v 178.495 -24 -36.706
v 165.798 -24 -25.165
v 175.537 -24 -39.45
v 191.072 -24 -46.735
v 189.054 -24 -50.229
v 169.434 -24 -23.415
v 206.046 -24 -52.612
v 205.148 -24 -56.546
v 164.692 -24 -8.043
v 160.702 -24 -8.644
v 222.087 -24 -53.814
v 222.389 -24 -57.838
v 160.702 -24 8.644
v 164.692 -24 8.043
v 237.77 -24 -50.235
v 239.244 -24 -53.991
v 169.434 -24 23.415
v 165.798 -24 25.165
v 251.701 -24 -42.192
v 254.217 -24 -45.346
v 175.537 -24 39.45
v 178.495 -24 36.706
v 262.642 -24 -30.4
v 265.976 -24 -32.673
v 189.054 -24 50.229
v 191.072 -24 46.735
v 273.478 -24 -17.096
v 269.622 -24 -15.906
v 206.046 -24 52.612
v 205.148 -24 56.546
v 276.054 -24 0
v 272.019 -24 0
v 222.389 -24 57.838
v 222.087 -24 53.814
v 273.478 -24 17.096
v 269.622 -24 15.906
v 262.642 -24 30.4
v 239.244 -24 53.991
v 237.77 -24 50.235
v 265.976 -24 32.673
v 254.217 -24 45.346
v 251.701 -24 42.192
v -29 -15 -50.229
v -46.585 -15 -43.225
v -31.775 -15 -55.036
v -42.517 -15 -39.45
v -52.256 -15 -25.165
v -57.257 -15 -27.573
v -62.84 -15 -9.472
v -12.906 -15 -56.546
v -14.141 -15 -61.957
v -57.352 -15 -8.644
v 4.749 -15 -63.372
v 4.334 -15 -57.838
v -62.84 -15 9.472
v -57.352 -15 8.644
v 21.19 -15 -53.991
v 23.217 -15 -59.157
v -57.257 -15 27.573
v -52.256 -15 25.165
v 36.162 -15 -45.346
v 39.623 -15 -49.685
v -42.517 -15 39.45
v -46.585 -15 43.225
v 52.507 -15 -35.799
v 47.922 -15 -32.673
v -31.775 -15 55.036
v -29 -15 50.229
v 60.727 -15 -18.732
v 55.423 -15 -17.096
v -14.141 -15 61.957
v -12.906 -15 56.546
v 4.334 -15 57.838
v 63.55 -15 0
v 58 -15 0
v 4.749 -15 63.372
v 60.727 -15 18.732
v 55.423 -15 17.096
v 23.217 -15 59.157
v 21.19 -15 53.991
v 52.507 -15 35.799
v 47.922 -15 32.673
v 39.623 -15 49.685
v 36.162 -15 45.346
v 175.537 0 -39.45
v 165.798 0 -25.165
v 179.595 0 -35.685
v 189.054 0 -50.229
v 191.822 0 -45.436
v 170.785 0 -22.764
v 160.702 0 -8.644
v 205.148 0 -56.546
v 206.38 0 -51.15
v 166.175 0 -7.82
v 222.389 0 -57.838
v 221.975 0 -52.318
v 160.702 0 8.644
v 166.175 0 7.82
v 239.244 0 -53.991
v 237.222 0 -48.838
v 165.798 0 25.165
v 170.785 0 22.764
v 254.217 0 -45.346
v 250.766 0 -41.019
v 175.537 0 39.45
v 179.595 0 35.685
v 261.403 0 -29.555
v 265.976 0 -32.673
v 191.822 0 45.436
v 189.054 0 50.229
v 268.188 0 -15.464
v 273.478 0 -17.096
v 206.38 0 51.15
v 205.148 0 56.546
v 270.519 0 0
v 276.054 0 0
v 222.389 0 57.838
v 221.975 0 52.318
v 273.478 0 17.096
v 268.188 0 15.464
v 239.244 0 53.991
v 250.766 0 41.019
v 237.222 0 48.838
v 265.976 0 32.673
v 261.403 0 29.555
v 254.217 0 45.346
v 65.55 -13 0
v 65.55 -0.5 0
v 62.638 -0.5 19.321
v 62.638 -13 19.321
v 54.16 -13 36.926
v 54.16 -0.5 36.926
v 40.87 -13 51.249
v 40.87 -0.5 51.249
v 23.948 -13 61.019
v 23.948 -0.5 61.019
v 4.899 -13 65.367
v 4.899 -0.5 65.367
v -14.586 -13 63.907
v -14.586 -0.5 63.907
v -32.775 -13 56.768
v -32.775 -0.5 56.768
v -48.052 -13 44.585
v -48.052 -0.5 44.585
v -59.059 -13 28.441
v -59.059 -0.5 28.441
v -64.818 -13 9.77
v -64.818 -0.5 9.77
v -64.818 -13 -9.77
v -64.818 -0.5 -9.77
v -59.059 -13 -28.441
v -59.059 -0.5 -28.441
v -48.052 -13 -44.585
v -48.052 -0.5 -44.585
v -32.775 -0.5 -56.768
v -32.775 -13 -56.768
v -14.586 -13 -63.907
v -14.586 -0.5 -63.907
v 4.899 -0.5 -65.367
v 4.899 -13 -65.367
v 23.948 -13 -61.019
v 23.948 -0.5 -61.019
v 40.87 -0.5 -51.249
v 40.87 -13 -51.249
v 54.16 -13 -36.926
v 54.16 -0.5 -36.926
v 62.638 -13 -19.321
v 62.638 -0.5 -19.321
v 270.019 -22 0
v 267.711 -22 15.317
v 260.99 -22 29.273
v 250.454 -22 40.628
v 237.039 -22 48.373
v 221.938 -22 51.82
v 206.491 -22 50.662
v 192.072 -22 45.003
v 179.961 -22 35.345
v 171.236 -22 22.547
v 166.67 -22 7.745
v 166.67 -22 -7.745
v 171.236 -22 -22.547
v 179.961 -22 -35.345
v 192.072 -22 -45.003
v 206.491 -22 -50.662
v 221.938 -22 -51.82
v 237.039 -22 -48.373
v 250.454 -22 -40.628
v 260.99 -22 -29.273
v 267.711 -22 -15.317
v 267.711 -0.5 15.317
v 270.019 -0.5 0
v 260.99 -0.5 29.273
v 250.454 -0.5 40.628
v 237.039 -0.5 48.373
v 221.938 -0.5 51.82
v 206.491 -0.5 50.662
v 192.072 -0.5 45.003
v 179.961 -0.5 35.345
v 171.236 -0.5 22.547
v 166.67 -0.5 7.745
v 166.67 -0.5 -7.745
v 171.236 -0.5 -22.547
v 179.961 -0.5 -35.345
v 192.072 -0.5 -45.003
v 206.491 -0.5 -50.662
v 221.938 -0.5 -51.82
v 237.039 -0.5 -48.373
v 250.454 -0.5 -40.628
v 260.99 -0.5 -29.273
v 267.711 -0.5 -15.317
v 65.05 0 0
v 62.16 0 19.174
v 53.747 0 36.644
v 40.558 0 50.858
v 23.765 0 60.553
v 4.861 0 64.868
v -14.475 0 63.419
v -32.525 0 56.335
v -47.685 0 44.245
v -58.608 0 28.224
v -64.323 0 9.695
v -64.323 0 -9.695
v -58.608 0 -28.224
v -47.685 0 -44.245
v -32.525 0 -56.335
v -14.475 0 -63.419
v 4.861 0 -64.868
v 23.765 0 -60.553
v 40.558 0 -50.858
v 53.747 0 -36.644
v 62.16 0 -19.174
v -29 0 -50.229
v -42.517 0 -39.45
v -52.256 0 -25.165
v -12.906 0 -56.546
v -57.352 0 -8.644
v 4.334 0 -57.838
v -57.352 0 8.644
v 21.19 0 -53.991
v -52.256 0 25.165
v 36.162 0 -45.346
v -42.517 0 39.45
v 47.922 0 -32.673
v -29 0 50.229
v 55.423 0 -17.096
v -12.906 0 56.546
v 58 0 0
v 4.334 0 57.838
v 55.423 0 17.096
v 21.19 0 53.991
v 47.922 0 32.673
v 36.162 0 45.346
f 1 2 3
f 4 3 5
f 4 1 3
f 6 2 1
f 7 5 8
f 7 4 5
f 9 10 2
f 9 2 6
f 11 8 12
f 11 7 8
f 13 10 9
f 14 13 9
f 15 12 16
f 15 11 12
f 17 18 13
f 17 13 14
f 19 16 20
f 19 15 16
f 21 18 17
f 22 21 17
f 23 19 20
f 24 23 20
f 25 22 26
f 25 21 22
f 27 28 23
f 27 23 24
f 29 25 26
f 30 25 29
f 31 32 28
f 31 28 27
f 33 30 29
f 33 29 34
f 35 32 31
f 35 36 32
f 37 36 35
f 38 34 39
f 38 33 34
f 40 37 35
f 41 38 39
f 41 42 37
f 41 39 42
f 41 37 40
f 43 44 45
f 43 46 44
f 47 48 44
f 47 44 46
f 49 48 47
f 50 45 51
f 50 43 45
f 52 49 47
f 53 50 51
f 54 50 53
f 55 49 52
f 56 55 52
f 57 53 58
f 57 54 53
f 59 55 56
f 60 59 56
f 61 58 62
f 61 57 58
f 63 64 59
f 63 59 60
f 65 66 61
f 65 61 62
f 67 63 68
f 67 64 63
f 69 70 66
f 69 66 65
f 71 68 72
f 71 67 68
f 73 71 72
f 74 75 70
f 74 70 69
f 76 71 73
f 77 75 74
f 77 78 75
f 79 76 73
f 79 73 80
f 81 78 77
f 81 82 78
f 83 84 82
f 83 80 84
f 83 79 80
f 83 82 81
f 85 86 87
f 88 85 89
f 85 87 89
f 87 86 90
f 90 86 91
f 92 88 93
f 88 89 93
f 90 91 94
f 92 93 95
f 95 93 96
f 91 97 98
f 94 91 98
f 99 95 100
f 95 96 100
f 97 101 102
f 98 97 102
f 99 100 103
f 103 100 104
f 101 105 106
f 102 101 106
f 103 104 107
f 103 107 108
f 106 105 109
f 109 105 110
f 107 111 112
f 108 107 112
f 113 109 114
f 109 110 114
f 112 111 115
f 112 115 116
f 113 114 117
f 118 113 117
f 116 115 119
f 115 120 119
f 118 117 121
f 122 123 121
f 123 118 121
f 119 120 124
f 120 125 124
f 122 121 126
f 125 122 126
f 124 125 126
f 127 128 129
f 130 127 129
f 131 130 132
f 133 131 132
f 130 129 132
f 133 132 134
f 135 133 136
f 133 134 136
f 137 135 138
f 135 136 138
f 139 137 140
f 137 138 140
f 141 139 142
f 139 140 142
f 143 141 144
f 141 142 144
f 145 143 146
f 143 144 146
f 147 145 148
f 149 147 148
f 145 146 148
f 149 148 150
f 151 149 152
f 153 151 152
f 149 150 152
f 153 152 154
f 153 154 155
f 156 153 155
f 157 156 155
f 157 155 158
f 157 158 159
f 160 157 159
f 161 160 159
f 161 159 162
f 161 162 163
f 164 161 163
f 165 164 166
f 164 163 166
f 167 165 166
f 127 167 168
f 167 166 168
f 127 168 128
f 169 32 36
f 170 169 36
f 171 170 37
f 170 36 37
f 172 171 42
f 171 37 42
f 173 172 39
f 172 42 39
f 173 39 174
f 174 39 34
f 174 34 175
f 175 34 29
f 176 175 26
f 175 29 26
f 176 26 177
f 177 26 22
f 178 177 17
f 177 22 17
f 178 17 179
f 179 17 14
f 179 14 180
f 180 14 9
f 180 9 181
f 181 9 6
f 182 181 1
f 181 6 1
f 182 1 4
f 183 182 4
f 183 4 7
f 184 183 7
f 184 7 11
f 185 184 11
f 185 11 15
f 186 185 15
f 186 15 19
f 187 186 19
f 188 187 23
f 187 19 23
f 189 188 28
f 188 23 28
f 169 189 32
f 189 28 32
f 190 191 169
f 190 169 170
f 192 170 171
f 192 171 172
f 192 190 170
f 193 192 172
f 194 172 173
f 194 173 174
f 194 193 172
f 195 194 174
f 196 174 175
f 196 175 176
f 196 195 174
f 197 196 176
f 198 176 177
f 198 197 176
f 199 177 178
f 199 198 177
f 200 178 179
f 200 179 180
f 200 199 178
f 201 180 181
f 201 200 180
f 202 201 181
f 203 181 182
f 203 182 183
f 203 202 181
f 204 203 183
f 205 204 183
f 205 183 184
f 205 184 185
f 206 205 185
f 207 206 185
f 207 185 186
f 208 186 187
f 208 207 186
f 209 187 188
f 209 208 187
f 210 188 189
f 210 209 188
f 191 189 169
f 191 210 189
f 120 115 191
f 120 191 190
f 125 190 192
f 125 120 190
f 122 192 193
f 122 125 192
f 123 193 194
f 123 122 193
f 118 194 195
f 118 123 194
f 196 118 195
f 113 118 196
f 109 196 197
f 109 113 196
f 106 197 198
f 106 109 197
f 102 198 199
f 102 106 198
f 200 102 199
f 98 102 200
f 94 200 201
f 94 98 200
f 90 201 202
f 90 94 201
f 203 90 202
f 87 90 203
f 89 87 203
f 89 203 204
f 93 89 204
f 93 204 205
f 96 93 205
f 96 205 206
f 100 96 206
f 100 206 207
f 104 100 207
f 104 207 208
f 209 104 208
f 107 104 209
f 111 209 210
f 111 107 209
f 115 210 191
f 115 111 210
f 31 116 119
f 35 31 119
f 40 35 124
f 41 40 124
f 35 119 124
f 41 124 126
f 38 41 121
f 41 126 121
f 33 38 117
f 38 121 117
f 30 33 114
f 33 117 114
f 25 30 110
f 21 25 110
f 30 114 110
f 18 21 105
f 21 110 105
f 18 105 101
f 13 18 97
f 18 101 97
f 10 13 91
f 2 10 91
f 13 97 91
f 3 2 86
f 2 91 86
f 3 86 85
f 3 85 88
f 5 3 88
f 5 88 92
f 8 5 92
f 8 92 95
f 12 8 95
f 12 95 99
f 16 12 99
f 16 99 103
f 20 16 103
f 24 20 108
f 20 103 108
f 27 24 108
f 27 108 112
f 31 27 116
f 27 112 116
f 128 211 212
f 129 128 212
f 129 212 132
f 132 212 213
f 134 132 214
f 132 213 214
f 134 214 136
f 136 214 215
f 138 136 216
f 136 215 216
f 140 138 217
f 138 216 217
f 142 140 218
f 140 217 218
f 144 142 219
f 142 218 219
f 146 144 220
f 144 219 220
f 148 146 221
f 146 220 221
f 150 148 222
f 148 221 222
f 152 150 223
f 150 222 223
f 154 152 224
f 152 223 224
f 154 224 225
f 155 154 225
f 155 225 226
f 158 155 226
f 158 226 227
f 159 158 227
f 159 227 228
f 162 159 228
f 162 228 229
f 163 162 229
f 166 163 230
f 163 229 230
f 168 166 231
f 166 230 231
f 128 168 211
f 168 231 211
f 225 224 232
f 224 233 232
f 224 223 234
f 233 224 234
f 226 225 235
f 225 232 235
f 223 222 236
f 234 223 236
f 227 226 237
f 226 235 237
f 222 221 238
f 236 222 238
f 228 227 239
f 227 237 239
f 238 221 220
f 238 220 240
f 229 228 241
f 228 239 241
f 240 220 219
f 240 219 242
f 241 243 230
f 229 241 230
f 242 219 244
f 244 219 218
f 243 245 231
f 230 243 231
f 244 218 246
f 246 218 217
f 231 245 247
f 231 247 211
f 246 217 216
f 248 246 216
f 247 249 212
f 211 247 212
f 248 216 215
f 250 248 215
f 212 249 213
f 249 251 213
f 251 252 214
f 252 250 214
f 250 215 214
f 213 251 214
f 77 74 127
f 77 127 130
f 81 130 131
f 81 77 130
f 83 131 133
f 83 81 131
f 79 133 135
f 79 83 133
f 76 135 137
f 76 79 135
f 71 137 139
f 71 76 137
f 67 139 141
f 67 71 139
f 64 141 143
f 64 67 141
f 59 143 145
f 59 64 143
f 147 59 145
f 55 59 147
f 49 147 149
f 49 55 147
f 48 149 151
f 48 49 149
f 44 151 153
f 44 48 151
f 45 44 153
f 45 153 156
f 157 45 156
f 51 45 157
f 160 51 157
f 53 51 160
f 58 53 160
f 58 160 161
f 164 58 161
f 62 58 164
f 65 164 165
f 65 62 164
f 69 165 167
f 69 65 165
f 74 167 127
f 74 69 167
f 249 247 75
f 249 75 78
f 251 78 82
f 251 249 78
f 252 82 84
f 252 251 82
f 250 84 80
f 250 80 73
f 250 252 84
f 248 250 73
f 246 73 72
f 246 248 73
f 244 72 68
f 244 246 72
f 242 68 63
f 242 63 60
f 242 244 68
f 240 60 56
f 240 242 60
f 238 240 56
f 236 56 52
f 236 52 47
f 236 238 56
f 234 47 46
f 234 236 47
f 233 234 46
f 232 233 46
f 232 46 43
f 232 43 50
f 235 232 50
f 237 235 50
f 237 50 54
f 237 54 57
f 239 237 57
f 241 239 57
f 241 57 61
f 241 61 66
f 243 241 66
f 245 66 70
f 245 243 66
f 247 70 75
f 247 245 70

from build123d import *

# Parameters (mm, degrees)
F1_R     = 58
F1_R_2   = 51.965
F2_DEPTH = 24
F3_SIZE  = 2
F4_SIZE  = 0.5
F0_R     = 65.55
F0_R_2   = 58
F5_DEPTH = 15
F6_SIZE  = 2
F7_SIZE  = 0.5


with BuildPart() as f2:
    # F1 (on Front) → F2 (new body)
    with BuildSketch(Plane.XZ):
        with Locations((218.054354, 0)):
            Circle(F1_R)
        with Locations((218.054354, 0)):
            Circle(F1_R_2, mode=Mode.SUBTRACT)
    extrude(amount=F2_DEPTH)

    # F3
    f3_edges = [f2.edges().sort_by_distance(p)[0] for p in [
        (166.089354, -24, 0),
    ]]
    chamfer(f3_edges, length=F3_SIZE)

    # F4
    f4_edges = [f2.edges().sort_by_distance(p)[0] for p in [
        (166.089354, 0, 0),
    ]]
    chamfer(f4_edges, length=F4_SIZE)


with BuildPart() as f5:
    # F0 (on Front) → F5 (new body)
    with BuildSketch(Plane.XZ):
        Circle(F0_R)
        Circle(F0_R_2, mode=Mode.SUBTRACT)
    extrude(amount=F5_DEPTH)

    # F6
    f6_edges = [f5.edges().sort_by_distance(p)[0] for p in [
        (-65.55, -15, 0),
    ]]
    chamfer(f6_edges, length=F6_SIZE)

    # F7
    f7_edges = [f5.edges().sort_by_distance(p)[0] for p in [
        (-65.55, 0, 0),
    ]]
    chamfer(f7_edges, length=F7_SIZE)


solid = Compound([f2.part, f5.part])
